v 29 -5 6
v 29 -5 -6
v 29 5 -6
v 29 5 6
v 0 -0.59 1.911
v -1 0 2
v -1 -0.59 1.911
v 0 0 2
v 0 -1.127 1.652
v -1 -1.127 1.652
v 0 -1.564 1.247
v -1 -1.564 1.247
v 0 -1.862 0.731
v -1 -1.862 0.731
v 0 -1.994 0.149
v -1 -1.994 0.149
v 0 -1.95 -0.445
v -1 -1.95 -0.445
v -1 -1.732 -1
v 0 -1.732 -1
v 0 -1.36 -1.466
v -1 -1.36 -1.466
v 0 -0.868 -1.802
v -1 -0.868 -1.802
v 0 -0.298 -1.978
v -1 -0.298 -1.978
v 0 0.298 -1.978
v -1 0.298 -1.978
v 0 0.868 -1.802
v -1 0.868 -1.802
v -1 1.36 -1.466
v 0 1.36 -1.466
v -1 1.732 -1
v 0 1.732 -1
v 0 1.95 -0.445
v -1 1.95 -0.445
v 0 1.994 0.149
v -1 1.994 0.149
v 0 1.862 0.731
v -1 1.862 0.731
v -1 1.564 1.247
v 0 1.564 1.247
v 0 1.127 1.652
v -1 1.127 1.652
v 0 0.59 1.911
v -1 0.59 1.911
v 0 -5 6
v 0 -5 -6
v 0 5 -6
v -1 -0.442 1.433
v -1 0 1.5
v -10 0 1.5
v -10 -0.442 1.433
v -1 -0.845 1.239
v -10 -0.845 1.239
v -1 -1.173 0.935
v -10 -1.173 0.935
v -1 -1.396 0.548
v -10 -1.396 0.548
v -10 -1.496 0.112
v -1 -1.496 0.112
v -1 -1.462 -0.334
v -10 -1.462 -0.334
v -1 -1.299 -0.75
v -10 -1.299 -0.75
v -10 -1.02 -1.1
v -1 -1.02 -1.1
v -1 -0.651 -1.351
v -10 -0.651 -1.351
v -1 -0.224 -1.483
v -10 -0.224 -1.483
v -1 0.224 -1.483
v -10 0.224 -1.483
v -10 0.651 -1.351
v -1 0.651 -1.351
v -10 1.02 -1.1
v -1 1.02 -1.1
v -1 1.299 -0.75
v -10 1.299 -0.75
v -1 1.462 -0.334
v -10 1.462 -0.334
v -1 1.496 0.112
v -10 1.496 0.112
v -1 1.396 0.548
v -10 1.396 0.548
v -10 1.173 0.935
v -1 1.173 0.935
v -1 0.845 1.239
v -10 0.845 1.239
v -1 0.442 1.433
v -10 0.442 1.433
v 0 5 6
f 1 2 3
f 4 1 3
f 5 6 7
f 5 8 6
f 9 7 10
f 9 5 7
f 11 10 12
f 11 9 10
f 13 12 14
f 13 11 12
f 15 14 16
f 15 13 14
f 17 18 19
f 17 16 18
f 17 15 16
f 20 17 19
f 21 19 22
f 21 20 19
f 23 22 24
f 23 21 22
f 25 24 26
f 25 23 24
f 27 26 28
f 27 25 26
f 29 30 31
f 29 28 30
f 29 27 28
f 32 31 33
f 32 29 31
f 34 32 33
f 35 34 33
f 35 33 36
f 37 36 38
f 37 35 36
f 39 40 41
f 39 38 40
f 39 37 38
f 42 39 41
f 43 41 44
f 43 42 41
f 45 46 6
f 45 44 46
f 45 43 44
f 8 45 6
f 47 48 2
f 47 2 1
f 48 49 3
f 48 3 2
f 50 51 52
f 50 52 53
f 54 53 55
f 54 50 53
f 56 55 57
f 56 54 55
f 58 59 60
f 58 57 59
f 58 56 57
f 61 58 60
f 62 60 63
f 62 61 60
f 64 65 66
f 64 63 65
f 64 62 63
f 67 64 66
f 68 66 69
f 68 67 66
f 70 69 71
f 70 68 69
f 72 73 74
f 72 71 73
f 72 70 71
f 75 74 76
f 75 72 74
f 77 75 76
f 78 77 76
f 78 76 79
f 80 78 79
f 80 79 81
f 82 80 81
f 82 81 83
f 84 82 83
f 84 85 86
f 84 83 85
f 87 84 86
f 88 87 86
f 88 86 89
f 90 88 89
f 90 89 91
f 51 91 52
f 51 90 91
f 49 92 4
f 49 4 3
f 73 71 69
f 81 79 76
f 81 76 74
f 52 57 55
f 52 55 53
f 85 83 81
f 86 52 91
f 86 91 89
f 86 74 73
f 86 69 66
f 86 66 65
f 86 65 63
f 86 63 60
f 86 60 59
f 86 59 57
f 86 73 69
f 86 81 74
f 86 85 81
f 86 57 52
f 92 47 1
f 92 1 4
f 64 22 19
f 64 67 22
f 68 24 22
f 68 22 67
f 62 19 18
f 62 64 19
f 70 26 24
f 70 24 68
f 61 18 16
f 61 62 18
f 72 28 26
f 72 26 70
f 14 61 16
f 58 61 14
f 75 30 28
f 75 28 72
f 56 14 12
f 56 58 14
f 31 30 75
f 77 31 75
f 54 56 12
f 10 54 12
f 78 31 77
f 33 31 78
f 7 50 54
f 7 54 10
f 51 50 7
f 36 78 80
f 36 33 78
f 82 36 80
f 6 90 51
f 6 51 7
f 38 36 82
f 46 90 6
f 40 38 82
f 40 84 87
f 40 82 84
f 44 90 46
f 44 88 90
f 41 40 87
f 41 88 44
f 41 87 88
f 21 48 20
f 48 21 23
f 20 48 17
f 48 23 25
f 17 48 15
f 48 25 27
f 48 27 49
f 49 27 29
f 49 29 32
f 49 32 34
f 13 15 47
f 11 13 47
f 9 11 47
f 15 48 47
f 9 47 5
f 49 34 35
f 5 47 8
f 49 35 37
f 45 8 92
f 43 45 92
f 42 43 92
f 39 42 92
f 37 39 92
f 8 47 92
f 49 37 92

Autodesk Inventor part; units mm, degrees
ref_plane "YZ Plane" through (0, 0, 0) normal (1, 0, 0) x (0, 1, 0)
ref_plane "XZ Plane" through (0, 0, 0) normal (0, 1, 0) x (-1, 0, 0)
ref_plane "XY Plane" through (0, 0, 0) normal (0, 0, 1) x (1, 0, 0)
sketch "Sketch1" plane through (0, 0, 0) normal (1, 0, 0) x (0, 1, 0)
  line L0 (-5, 6) -> (5, 6)
  line L1 (5, 6) -> (5, -6)
  line L2 (5, -6) -> (-5, -6)
  line L3 (-5, -6) -> (-5, 6)
  line L4 (-5, 6) -> (5, -6) construction
  line L5 (5, 6) -> (-5, -6) construction
  point P0 (0, 0)
  dimension "d0" = 10
  dimension "d1" = 12
extrude "Extrusion1" add sketch "Sketch1" along normal blind 29
sketch "Sketch2" plane through (0, 0, 0) normal (-1, 0, 0) x (0, 0, 1)
  circle A0 centre (0, 0) radius 2
  dimension "d4" = 4
extrude "Extrusion2" add sketch "Sketch2" along normal blind 1
sketch "Sketch3" plane through (-1, 0, 0) normal (-1, 0, 0) x (0, 0, 1)
  circle A0 centre (0, 0) radius 1.5
  dimension "d7" = 3
extrude "Extrusion3" add sketch "Sketch3" along normal blind 9
properties part number "Micro Gear motor" material "Copper, Alloy"
